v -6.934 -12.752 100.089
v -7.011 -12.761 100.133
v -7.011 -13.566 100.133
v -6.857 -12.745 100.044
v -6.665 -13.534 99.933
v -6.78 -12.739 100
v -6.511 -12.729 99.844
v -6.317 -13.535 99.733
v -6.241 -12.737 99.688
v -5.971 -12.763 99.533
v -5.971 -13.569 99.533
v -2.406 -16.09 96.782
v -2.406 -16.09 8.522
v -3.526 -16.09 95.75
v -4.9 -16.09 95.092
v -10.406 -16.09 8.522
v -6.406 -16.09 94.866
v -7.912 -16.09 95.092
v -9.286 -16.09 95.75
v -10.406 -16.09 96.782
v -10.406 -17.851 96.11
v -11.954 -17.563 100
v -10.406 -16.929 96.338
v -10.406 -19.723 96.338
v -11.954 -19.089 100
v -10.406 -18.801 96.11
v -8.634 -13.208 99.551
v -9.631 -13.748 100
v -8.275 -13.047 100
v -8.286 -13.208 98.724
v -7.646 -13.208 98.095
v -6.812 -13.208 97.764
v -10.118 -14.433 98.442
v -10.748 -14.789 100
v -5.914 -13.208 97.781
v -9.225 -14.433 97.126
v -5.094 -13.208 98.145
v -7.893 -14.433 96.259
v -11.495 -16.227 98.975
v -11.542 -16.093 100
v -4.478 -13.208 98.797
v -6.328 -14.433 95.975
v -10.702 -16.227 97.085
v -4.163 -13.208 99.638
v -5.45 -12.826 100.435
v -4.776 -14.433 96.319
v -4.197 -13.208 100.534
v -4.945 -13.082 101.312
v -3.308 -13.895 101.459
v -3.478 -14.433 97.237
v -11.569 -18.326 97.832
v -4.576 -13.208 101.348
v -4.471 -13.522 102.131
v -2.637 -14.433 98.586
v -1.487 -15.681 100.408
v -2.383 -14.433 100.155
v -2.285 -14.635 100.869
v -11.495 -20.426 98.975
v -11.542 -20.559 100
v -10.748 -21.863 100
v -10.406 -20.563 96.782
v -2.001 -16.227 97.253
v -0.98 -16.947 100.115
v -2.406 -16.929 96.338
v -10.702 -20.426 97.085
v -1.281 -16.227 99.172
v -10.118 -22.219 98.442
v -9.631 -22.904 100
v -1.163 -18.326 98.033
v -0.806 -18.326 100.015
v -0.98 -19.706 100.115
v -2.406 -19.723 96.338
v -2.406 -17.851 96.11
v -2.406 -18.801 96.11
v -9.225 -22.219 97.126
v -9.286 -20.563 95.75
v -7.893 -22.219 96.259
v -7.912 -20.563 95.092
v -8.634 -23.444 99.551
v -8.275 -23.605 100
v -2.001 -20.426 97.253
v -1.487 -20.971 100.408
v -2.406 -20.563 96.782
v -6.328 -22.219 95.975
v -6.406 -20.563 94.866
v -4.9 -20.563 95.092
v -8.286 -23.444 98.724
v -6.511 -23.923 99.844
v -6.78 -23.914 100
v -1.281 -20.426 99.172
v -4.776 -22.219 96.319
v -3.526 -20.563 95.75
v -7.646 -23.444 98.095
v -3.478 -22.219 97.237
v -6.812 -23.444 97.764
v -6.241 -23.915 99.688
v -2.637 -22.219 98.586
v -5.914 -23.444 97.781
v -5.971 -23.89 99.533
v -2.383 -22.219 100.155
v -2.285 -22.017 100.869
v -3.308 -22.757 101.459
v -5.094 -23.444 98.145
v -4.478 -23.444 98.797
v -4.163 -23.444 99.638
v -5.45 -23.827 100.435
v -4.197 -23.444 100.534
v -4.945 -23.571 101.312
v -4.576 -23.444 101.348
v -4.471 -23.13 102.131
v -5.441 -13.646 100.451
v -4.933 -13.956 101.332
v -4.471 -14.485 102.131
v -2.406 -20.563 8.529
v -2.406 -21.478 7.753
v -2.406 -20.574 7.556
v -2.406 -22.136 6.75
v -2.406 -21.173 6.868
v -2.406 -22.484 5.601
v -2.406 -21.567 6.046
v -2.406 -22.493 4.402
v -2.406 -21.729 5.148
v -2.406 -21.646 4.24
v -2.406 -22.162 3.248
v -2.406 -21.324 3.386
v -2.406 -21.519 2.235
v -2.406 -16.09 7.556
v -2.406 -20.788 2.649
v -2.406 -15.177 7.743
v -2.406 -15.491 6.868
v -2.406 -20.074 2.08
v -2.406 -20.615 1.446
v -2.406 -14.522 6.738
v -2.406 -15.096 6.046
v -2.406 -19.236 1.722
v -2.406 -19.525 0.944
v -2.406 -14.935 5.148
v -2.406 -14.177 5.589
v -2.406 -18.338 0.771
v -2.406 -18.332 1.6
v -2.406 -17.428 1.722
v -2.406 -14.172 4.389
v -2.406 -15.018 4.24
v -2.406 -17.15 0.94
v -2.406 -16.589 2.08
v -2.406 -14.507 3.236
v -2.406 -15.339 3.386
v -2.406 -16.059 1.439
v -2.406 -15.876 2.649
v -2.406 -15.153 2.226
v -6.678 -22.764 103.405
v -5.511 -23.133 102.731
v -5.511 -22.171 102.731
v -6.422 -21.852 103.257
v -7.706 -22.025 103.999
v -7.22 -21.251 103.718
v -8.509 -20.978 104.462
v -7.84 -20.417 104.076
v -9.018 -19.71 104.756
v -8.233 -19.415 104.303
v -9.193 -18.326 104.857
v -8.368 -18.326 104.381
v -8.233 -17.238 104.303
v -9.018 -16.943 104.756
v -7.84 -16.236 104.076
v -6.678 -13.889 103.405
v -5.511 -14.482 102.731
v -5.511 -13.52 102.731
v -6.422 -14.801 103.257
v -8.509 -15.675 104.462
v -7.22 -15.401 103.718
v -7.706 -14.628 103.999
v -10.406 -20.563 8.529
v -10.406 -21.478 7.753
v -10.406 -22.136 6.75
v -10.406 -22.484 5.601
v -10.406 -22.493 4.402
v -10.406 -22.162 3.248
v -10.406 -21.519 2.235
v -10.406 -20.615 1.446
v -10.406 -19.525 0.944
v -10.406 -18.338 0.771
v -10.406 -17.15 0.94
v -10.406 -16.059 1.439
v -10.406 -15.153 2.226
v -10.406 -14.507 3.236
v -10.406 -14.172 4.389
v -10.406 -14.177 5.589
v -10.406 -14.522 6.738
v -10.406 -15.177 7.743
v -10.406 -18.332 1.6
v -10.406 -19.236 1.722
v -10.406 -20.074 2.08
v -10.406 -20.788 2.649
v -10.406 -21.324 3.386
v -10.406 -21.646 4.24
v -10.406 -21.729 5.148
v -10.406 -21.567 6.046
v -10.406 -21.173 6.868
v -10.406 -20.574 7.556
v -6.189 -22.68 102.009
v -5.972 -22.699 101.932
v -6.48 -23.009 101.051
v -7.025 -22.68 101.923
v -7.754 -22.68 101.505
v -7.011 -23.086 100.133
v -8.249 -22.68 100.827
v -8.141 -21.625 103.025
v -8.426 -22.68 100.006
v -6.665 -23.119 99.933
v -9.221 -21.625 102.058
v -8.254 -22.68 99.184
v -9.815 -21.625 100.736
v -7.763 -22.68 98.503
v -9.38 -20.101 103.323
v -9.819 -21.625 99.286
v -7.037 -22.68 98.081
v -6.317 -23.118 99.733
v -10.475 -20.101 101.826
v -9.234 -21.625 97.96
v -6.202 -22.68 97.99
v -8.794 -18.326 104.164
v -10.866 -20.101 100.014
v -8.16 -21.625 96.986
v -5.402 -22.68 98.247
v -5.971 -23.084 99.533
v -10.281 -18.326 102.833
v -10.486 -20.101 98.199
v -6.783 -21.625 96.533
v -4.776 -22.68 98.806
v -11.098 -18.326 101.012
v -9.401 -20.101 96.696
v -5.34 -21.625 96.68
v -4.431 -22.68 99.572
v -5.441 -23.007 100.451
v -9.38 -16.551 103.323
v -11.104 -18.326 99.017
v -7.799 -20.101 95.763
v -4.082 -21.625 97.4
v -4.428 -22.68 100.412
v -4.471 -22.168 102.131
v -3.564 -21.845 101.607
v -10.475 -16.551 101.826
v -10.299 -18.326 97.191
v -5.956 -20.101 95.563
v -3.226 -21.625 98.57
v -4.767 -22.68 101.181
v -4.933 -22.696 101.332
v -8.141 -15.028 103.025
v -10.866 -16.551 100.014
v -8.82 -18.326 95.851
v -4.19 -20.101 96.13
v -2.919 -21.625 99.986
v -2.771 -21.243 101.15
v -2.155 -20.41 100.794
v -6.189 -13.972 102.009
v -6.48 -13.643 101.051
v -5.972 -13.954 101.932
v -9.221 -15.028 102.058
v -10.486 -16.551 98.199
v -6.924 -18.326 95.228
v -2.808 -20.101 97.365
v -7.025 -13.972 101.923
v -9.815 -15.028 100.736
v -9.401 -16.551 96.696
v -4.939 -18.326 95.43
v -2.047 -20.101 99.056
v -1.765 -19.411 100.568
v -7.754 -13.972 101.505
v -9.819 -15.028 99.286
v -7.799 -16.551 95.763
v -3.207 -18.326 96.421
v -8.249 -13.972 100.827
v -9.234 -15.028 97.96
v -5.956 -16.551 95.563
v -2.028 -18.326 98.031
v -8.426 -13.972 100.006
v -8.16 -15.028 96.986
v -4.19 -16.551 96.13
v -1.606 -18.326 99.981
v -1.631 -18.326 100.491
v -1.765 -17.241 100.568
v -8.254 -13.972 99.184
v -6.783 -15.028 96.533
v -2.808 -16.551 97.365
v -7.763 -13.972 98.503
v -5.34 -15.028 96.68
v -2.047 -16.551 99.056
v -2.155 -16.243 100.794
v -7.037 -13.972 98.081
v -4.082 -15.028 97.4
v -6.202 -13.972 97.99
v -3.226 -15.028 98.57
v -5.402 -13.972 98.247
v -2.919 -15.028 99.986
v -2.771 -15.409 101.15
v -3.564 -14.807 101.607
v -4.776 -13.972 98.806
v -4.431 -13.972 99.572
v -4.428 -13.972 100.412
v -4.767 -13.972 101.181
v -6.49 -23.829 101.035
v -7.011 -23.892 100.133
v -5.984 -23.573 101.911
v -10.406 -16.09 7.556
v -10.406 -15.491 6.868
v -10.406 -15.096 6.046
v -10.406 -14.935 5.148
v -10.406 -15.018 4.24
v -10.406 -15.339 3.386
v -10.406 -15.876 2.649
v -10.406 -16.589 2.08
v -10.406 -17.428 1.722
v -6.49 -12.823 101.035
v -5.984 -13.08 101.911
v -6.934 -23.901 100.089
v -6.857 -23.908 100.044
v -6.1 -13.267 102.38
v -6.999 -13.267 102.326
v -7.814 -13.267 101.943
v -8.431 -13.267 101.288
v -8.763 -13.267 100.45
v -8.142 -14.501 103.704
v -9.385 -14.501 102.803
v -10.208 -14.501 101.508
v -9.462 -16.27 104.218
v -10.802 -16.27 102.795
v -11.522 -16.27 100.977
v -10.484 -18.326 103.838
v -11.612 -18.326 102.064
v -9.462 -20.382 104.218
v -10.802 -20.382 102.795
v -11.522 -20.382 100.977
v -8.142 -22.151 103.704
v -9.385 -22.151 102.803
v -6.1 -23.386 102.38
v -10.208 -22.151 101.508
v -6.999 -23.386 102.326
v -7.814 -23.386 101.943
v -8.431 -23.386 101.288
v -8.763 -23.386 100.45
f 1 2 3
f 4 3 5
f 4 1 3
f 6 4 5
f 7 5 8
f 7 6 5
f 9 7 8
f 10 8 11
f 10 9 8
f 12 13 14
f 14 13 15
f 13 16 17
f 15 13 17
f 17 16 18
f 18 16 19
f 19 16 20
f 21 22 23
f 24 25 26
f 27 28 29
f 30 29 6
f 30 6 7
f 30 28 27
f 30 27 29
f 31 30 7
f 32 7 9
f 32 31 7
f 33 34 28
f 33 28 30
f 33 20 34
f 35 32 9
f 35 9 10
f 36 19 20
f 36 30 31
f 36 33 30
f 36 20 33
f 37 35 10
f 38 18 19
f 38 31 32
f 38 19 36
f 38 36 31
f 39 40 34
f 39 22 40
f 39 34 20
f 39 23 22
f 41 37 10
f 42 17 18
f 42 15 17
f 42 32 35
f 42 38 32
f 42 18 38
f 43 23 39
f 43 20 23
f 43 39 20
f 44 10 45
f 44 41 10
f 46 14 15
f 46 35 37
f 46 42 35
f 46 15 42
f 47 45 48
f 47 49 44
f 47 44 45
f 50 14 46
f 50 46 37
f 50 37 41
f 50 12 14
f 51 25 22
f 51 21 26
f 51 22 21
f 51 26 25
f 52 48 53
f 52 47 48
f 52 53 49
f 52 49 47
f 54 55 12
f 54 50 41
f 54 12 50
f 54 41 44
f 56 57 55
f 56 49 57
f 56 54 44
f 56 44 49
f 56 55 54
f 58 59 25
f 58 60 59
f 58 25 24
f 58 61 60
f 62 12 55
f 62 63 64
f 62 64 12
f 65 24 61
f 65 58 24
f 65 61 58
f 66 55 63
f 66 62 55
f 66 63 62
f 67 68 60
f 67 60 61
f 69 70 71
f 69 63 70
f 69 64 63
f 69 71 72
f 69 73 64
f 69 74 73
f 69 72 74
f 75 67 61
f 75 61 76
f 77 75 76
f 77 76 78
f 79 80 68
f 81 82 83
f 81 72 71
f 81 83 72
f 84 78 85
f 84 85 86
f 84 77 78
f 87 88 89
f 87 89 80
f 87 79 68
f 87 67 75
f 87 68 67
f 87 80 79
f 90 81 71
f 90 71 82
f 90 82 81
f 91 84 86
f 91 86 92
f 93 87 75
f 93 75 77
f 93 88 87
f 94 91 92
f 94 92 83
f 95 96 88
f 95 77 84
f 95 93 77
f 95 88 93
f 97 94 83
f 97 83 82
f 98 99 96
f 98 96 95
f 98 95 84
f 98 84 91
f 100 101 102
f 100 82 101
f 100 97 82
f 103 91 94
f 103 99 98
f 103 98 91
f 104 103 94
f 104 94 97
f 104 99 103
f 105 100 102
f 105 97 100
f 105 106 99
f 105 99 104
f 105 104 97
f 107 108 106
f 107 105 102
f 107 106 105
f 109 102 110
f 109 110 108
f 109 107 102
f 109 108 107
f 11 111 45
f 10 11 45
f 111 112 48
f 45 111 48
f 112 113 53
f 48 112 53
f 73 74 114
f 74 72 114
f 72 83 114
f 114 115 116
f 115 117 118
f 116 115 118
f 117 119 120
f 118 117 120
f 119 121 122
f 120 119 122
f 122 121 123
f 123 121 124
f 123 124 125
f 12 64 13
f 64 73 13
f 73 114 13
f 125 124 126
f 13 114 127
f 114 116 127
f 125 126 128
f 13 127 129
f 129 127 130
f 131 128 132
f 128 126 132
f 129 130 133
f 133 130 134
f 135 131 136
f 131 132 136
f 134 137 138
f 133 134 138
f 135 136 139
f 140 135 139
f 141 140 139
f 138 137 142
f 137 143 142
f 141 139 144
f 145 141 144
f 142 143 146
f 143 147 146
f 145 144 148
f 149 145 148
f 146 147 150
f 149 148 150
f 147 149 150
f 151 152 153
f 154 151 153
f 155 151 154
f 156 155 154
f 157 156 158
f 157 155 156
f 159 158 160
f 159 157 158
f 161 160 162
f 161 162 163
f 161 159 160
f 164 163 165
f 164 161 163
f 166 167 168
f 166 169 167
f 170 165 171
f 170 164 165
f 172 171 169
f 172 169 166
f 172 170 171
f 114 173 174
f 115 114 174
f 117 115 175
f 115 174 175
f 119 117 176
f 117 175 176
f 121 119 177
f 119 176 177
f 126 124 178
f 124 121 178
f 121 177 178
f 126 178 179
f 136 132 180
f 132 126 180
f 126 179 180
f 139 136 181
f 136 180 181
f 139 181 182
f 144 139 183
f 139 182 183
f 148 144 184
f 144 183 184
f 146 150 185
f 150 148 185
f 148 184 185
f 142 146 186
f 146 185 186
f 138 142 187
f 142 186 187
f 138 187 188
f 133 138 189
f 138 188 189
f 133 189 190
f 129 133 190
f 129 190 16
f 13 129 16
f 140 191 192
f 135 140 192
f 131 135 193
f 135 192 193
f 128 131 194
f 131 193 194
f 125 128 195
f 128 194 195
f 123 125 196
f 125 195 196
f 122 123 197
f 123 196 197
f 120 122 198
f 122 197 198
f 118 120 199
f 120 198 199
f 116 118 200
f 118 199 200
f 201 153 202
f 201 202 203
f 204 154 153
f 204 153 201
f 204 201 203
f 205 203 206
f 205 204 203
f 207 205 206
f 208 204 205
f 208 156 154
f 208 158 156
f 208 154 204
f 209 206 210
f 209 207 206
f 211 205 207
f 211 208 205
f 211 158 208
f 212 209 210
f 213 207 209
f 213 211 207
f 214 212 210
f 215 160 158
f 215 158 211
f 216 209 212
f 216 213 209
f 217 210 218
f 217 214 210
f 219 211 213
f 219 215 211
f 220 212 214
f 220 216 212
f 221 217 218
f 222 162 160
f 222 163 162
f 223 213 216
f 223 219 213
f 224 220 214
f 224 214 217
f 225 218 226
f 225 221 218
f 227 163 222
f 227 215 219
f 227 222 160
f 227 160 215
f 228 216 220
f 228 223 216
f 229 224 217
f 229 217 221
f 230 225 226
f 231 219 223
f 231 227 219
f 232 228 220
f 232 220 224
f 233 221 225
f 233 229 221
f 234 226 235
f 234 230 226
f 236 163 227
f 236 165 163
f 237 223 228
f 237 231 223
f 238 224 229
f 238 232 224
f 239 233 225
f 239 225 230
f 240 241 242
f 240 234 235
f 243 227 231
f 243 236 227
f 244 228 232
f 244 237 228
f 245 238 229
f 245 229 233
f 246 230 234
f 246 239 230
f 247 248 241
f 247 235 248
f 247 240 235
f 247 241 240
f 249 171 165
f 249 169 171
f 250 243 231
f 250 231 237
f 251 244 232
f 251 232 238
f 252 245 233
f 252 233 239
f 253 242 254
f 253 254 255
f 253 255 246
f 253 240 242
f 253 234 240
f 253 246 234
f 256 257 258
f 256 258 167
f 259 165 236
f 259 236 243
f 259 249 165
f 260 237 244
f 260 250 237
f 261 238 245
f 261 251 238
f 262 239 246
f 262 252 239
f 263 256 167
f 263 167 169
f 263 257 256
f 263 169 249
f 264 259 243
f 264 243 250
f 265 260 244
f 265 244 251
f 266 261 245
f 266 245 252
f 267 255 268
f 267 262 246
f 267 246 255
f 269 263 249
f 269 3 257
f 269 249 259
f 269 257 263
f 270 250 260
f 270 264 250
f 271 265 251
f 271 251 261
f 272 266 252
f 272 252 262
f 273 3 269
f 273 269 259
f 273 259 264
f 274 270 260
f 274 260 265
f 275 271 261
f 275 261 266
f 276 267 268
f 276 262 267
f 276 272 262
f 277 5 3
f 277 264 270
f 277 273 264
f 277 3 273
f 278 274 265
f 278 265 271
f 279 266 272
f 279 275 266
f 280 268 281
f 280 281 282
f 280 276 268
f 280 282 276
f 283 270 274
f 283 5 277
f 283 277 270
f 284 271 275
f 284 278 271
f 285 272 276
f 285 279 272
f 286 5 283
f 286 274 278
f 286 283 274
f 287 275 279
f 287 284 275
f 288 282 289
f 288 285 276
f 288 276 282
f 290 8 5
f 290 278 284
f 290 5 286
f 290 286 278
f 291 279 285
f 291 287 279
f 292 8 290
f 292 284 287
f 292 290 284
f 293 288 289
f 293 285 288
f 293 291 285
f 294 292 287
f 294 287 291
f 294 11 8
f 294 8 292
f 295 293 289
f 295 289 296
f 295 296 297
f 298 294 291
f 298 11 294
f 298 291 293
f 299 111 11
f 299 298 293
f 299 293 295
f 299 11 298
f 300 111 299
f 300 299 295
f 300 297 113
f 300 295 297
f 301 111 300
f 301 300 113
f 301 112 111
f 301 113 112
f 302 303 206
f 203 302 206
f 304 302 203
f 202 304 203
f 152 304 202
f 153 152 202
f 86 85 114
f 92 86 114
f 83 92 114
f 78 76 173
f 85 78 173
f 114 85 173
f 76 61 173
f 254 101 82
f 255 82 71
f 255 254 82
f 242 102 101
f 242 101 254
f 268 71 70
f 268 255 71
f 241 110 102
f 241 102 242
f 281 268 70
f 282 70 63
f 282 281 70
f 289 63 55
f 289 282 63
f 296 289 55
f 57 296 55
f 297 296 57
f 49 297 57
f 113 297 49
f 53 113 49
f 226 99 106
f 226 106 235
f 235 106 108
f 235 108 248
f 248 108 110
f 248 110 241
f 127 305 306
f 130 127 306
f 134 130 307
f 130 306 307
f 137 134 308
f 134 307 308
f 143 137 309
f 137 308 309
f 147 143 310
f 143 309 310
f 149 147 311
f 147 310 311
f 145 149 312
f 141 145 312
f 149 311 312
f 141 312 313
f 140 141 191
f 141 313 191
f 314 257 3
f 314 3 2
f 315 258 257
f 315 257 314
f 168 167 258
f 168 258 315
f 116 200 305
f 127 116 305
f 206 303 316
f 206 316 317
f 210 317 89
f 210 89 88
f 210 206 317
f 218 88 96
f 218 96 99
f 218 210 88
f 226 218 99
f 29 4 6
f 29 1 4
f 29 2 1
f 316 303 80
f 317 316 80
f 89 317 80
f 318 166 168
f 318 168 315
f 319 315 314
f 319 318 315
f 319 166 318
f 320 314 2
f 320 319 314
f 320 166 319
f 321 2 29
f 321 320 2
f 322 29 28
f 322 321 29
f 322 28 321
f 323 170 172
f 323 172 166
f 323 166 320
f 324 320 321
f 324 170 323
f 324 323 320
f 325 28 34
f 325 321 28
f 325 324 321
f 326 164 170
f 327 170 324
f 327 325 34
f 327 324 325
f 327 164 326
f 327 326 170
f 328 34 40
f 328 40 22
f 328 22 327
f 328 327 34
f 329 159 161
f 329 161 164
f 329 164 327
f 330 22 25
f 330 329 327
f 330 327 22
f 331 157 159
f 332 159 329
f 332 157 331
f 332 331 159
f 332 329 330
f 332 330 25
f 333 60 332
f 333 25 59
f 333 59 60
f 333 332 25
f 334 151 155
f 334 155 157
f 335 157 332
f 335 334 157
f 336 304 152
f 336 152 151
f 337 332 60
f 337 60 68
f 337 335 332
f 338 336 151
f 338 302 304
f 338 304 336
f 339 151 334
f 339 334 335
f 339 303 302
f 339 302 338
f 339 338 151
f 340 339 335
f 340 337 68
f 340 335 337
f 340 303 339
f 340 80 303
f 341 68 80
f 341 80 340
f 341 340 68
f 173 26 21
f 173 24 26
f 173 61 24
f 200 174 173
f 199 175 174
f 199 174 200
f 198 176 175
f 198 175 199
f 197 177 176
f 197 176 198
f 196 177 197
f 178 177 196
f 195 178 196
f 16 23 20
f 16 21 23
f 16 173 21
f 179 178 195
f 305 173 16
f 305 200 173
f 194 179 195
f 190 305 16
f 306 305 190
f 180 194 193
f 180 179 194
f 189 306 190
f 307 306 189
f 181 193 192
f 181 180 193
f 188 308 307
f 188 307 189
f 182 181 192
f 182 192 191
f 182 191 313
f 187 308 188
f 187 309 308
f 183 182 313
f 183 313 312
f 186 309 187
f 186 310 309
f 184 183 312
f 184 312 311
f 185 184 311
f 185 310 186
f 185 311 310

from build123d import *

# Parameters (mm, degrees)
SKETCH_1_W                = 8
SKETCH_1_H                = 12
EXTRUDE_1_DEPTH           = 100
CUT_EXTRUDE_3_DEPTH       = 10
CUT_EXTRUDE_11_DEPTH      = 100
CUT_EXTRUDE_14_DEPTH      = 18
CUT_EXTRUDE_14_DEPTH_BACK = 18
SKETCH_16_W               = 6.416978836
SKETCH_16_H               = 19.46348209
SKETCH_17_W               = 1.2
SKETCH_17_H               = 11.2
CUT_EXTRUDE_15_DEPTH      = 3


with BuildPart() as part:
    # 草图1 → 凸台-拉伸1 (new body)
    with BuildSketch(Plane.XY):
        with Locations((-6.4060213, -18.331726276)):
            Rectangle(SKETCH_1_W, SKETCH_1_H)
    extrude(amount=EXTRUDE_1_DEPTH)

    # 草图5 → 切除-拉伸3 (cut)
    with BuildSketch(Plane.ZY.offset(10.4060213)):
        with BuildLine():
            Line((7.555938676, -20.573863088), (7.555938676, -16.089589464))
            ThreePointArc((7.555938676, -16.089589464), (3.802125111, -15.149730715), (1.6, -18.331726276))
            ThreePointArc((1.6, -18.331726276), (3.802125111, -21.513721837), (7.555938676, -20.573863088))
        make_face()
    extrude(amount=-CUT_EXTRUDE_3_DEPTH, mode=Mode.SUBTRACT)

    # 草图2 → 切除-拉伸11 (cut)
    with BuildSketch(Plane.ZY.offset(10.4060213)):
        with BuildLine():
            Line((0, -12.331726276), (-0.01185689, -12.331726276))
            Line((-0.01185689, -12.331726276), (-0.01185689, -24.331726276))
            Line((-0.01185689, -24.331726276), (0, -24.331726276))
            Line((0, -24.331726276), (22.555938676, -24.331726276))
            Line((22.555938676, -24.331726276), (100, -24.331726276))
            Line((100, -24.331726276), (100.024770408, -20.562939428))
            Line((100.024770408, -20.562939428), (8.52899758, -20.562939428))
            ThreePointArc((8.52899758, -20.562939428), (0.770675983, -18.338179262), (8.522124603, -16.089589464))
            Line((8.522124603, -16.089589464), (100.024770408, -16.089589464))
            Line((100.024770408, -16.089589464), (100, -12.331726276))
            Line((100, -12.331726276), (0, -12.331726276))
        make_face()
    extrude(amount=-CUT_EXTRUDE_11_DEPTH, mode=Mode.SUBTRACT)

    # 草图12 → 旋转3 (revolve)
    with BuildSketch(Plane.XY.offset(100)):
        with BuildLine():
            Line((-6.4060213, -13.526264446), (-6.4060213, -12.726264446))
            ThreePointArc((-6.4060213, -12.726264446), (-12.0060213, -18.326264446), (-6.4060213, -23.926264446))
            Line((-6.4060213, -23.926264446), (-6.4060213, -23.126264446))
            ThreePointArc((-6.4060213, -23.126264446), (-11.2060213, -18.326264446), (-6.4060213, -13.526264446))
        make_face()
    revolve(axis=Axis((-6.4060213, -12.726264446, 100), (0, -1, 0)))

    # 草图12<4> → 切除-旋转1 (revolve, cut)
    with BuildSketch(Plane.XY.offset(100)):
        with BuildLine():
            ThreePointArc((-6.4060213, -13.526264446), (-11.2060213, -18.326264446), (-6.4060213, -23.126264446))
            Line((-6.4060213, -23.126264446), (-6.4060213, -13.526264446))
        make_face()
    revolve(axis=Axis((-6.4060213, -12.726264446, 100), (0, -1, 0)), mode=Mode.SUBTRACT)

    # 草图16 → 切除-拉伸14 (cut, two sides: drawn at the far end of the back side and taken through both)
    with BuildSketch(Plane(origin=(-52.372486851, 0, 30.237269382), x_dir=(0.49999999999999806, 0, 0.8660254037844398), z_dir=(-0.8660254037844397, 0, 0.499999999999998)).offset(-CUT_EXTRUDE_14_DEPTH_BACK)):
        with Locations((89.420800734, -19.375704403)):
            Rectangle(SKETCH_16_W, SKETCH_16_H)
    extrude(amount=CUT_EXTRUDE_14_DEPTH + CUT_EXTRUDE_14_DEPTH_BACK, mode=Mode.SUBTRACT)

    # 草图17 → 切除-拉伸15 (cut)
    with BuildSketch(Plane(origin=(43.106155658, 0, 74.662051718), x_dir=(0.8660254037844397, 0, -0.4999999999999981), z_dir=(0.4999999999999981, 0, 0.8660254037844397))):
        with Locations((-55.537824976, -18.326264446)):
            Rectangle(SKETCH_17_W, SKETCH_17_H)
    extrude(amount=-CUT_EXTRUDE_15_DEPTH, mode=Mode.SUBTRACT)


solid = part.part
